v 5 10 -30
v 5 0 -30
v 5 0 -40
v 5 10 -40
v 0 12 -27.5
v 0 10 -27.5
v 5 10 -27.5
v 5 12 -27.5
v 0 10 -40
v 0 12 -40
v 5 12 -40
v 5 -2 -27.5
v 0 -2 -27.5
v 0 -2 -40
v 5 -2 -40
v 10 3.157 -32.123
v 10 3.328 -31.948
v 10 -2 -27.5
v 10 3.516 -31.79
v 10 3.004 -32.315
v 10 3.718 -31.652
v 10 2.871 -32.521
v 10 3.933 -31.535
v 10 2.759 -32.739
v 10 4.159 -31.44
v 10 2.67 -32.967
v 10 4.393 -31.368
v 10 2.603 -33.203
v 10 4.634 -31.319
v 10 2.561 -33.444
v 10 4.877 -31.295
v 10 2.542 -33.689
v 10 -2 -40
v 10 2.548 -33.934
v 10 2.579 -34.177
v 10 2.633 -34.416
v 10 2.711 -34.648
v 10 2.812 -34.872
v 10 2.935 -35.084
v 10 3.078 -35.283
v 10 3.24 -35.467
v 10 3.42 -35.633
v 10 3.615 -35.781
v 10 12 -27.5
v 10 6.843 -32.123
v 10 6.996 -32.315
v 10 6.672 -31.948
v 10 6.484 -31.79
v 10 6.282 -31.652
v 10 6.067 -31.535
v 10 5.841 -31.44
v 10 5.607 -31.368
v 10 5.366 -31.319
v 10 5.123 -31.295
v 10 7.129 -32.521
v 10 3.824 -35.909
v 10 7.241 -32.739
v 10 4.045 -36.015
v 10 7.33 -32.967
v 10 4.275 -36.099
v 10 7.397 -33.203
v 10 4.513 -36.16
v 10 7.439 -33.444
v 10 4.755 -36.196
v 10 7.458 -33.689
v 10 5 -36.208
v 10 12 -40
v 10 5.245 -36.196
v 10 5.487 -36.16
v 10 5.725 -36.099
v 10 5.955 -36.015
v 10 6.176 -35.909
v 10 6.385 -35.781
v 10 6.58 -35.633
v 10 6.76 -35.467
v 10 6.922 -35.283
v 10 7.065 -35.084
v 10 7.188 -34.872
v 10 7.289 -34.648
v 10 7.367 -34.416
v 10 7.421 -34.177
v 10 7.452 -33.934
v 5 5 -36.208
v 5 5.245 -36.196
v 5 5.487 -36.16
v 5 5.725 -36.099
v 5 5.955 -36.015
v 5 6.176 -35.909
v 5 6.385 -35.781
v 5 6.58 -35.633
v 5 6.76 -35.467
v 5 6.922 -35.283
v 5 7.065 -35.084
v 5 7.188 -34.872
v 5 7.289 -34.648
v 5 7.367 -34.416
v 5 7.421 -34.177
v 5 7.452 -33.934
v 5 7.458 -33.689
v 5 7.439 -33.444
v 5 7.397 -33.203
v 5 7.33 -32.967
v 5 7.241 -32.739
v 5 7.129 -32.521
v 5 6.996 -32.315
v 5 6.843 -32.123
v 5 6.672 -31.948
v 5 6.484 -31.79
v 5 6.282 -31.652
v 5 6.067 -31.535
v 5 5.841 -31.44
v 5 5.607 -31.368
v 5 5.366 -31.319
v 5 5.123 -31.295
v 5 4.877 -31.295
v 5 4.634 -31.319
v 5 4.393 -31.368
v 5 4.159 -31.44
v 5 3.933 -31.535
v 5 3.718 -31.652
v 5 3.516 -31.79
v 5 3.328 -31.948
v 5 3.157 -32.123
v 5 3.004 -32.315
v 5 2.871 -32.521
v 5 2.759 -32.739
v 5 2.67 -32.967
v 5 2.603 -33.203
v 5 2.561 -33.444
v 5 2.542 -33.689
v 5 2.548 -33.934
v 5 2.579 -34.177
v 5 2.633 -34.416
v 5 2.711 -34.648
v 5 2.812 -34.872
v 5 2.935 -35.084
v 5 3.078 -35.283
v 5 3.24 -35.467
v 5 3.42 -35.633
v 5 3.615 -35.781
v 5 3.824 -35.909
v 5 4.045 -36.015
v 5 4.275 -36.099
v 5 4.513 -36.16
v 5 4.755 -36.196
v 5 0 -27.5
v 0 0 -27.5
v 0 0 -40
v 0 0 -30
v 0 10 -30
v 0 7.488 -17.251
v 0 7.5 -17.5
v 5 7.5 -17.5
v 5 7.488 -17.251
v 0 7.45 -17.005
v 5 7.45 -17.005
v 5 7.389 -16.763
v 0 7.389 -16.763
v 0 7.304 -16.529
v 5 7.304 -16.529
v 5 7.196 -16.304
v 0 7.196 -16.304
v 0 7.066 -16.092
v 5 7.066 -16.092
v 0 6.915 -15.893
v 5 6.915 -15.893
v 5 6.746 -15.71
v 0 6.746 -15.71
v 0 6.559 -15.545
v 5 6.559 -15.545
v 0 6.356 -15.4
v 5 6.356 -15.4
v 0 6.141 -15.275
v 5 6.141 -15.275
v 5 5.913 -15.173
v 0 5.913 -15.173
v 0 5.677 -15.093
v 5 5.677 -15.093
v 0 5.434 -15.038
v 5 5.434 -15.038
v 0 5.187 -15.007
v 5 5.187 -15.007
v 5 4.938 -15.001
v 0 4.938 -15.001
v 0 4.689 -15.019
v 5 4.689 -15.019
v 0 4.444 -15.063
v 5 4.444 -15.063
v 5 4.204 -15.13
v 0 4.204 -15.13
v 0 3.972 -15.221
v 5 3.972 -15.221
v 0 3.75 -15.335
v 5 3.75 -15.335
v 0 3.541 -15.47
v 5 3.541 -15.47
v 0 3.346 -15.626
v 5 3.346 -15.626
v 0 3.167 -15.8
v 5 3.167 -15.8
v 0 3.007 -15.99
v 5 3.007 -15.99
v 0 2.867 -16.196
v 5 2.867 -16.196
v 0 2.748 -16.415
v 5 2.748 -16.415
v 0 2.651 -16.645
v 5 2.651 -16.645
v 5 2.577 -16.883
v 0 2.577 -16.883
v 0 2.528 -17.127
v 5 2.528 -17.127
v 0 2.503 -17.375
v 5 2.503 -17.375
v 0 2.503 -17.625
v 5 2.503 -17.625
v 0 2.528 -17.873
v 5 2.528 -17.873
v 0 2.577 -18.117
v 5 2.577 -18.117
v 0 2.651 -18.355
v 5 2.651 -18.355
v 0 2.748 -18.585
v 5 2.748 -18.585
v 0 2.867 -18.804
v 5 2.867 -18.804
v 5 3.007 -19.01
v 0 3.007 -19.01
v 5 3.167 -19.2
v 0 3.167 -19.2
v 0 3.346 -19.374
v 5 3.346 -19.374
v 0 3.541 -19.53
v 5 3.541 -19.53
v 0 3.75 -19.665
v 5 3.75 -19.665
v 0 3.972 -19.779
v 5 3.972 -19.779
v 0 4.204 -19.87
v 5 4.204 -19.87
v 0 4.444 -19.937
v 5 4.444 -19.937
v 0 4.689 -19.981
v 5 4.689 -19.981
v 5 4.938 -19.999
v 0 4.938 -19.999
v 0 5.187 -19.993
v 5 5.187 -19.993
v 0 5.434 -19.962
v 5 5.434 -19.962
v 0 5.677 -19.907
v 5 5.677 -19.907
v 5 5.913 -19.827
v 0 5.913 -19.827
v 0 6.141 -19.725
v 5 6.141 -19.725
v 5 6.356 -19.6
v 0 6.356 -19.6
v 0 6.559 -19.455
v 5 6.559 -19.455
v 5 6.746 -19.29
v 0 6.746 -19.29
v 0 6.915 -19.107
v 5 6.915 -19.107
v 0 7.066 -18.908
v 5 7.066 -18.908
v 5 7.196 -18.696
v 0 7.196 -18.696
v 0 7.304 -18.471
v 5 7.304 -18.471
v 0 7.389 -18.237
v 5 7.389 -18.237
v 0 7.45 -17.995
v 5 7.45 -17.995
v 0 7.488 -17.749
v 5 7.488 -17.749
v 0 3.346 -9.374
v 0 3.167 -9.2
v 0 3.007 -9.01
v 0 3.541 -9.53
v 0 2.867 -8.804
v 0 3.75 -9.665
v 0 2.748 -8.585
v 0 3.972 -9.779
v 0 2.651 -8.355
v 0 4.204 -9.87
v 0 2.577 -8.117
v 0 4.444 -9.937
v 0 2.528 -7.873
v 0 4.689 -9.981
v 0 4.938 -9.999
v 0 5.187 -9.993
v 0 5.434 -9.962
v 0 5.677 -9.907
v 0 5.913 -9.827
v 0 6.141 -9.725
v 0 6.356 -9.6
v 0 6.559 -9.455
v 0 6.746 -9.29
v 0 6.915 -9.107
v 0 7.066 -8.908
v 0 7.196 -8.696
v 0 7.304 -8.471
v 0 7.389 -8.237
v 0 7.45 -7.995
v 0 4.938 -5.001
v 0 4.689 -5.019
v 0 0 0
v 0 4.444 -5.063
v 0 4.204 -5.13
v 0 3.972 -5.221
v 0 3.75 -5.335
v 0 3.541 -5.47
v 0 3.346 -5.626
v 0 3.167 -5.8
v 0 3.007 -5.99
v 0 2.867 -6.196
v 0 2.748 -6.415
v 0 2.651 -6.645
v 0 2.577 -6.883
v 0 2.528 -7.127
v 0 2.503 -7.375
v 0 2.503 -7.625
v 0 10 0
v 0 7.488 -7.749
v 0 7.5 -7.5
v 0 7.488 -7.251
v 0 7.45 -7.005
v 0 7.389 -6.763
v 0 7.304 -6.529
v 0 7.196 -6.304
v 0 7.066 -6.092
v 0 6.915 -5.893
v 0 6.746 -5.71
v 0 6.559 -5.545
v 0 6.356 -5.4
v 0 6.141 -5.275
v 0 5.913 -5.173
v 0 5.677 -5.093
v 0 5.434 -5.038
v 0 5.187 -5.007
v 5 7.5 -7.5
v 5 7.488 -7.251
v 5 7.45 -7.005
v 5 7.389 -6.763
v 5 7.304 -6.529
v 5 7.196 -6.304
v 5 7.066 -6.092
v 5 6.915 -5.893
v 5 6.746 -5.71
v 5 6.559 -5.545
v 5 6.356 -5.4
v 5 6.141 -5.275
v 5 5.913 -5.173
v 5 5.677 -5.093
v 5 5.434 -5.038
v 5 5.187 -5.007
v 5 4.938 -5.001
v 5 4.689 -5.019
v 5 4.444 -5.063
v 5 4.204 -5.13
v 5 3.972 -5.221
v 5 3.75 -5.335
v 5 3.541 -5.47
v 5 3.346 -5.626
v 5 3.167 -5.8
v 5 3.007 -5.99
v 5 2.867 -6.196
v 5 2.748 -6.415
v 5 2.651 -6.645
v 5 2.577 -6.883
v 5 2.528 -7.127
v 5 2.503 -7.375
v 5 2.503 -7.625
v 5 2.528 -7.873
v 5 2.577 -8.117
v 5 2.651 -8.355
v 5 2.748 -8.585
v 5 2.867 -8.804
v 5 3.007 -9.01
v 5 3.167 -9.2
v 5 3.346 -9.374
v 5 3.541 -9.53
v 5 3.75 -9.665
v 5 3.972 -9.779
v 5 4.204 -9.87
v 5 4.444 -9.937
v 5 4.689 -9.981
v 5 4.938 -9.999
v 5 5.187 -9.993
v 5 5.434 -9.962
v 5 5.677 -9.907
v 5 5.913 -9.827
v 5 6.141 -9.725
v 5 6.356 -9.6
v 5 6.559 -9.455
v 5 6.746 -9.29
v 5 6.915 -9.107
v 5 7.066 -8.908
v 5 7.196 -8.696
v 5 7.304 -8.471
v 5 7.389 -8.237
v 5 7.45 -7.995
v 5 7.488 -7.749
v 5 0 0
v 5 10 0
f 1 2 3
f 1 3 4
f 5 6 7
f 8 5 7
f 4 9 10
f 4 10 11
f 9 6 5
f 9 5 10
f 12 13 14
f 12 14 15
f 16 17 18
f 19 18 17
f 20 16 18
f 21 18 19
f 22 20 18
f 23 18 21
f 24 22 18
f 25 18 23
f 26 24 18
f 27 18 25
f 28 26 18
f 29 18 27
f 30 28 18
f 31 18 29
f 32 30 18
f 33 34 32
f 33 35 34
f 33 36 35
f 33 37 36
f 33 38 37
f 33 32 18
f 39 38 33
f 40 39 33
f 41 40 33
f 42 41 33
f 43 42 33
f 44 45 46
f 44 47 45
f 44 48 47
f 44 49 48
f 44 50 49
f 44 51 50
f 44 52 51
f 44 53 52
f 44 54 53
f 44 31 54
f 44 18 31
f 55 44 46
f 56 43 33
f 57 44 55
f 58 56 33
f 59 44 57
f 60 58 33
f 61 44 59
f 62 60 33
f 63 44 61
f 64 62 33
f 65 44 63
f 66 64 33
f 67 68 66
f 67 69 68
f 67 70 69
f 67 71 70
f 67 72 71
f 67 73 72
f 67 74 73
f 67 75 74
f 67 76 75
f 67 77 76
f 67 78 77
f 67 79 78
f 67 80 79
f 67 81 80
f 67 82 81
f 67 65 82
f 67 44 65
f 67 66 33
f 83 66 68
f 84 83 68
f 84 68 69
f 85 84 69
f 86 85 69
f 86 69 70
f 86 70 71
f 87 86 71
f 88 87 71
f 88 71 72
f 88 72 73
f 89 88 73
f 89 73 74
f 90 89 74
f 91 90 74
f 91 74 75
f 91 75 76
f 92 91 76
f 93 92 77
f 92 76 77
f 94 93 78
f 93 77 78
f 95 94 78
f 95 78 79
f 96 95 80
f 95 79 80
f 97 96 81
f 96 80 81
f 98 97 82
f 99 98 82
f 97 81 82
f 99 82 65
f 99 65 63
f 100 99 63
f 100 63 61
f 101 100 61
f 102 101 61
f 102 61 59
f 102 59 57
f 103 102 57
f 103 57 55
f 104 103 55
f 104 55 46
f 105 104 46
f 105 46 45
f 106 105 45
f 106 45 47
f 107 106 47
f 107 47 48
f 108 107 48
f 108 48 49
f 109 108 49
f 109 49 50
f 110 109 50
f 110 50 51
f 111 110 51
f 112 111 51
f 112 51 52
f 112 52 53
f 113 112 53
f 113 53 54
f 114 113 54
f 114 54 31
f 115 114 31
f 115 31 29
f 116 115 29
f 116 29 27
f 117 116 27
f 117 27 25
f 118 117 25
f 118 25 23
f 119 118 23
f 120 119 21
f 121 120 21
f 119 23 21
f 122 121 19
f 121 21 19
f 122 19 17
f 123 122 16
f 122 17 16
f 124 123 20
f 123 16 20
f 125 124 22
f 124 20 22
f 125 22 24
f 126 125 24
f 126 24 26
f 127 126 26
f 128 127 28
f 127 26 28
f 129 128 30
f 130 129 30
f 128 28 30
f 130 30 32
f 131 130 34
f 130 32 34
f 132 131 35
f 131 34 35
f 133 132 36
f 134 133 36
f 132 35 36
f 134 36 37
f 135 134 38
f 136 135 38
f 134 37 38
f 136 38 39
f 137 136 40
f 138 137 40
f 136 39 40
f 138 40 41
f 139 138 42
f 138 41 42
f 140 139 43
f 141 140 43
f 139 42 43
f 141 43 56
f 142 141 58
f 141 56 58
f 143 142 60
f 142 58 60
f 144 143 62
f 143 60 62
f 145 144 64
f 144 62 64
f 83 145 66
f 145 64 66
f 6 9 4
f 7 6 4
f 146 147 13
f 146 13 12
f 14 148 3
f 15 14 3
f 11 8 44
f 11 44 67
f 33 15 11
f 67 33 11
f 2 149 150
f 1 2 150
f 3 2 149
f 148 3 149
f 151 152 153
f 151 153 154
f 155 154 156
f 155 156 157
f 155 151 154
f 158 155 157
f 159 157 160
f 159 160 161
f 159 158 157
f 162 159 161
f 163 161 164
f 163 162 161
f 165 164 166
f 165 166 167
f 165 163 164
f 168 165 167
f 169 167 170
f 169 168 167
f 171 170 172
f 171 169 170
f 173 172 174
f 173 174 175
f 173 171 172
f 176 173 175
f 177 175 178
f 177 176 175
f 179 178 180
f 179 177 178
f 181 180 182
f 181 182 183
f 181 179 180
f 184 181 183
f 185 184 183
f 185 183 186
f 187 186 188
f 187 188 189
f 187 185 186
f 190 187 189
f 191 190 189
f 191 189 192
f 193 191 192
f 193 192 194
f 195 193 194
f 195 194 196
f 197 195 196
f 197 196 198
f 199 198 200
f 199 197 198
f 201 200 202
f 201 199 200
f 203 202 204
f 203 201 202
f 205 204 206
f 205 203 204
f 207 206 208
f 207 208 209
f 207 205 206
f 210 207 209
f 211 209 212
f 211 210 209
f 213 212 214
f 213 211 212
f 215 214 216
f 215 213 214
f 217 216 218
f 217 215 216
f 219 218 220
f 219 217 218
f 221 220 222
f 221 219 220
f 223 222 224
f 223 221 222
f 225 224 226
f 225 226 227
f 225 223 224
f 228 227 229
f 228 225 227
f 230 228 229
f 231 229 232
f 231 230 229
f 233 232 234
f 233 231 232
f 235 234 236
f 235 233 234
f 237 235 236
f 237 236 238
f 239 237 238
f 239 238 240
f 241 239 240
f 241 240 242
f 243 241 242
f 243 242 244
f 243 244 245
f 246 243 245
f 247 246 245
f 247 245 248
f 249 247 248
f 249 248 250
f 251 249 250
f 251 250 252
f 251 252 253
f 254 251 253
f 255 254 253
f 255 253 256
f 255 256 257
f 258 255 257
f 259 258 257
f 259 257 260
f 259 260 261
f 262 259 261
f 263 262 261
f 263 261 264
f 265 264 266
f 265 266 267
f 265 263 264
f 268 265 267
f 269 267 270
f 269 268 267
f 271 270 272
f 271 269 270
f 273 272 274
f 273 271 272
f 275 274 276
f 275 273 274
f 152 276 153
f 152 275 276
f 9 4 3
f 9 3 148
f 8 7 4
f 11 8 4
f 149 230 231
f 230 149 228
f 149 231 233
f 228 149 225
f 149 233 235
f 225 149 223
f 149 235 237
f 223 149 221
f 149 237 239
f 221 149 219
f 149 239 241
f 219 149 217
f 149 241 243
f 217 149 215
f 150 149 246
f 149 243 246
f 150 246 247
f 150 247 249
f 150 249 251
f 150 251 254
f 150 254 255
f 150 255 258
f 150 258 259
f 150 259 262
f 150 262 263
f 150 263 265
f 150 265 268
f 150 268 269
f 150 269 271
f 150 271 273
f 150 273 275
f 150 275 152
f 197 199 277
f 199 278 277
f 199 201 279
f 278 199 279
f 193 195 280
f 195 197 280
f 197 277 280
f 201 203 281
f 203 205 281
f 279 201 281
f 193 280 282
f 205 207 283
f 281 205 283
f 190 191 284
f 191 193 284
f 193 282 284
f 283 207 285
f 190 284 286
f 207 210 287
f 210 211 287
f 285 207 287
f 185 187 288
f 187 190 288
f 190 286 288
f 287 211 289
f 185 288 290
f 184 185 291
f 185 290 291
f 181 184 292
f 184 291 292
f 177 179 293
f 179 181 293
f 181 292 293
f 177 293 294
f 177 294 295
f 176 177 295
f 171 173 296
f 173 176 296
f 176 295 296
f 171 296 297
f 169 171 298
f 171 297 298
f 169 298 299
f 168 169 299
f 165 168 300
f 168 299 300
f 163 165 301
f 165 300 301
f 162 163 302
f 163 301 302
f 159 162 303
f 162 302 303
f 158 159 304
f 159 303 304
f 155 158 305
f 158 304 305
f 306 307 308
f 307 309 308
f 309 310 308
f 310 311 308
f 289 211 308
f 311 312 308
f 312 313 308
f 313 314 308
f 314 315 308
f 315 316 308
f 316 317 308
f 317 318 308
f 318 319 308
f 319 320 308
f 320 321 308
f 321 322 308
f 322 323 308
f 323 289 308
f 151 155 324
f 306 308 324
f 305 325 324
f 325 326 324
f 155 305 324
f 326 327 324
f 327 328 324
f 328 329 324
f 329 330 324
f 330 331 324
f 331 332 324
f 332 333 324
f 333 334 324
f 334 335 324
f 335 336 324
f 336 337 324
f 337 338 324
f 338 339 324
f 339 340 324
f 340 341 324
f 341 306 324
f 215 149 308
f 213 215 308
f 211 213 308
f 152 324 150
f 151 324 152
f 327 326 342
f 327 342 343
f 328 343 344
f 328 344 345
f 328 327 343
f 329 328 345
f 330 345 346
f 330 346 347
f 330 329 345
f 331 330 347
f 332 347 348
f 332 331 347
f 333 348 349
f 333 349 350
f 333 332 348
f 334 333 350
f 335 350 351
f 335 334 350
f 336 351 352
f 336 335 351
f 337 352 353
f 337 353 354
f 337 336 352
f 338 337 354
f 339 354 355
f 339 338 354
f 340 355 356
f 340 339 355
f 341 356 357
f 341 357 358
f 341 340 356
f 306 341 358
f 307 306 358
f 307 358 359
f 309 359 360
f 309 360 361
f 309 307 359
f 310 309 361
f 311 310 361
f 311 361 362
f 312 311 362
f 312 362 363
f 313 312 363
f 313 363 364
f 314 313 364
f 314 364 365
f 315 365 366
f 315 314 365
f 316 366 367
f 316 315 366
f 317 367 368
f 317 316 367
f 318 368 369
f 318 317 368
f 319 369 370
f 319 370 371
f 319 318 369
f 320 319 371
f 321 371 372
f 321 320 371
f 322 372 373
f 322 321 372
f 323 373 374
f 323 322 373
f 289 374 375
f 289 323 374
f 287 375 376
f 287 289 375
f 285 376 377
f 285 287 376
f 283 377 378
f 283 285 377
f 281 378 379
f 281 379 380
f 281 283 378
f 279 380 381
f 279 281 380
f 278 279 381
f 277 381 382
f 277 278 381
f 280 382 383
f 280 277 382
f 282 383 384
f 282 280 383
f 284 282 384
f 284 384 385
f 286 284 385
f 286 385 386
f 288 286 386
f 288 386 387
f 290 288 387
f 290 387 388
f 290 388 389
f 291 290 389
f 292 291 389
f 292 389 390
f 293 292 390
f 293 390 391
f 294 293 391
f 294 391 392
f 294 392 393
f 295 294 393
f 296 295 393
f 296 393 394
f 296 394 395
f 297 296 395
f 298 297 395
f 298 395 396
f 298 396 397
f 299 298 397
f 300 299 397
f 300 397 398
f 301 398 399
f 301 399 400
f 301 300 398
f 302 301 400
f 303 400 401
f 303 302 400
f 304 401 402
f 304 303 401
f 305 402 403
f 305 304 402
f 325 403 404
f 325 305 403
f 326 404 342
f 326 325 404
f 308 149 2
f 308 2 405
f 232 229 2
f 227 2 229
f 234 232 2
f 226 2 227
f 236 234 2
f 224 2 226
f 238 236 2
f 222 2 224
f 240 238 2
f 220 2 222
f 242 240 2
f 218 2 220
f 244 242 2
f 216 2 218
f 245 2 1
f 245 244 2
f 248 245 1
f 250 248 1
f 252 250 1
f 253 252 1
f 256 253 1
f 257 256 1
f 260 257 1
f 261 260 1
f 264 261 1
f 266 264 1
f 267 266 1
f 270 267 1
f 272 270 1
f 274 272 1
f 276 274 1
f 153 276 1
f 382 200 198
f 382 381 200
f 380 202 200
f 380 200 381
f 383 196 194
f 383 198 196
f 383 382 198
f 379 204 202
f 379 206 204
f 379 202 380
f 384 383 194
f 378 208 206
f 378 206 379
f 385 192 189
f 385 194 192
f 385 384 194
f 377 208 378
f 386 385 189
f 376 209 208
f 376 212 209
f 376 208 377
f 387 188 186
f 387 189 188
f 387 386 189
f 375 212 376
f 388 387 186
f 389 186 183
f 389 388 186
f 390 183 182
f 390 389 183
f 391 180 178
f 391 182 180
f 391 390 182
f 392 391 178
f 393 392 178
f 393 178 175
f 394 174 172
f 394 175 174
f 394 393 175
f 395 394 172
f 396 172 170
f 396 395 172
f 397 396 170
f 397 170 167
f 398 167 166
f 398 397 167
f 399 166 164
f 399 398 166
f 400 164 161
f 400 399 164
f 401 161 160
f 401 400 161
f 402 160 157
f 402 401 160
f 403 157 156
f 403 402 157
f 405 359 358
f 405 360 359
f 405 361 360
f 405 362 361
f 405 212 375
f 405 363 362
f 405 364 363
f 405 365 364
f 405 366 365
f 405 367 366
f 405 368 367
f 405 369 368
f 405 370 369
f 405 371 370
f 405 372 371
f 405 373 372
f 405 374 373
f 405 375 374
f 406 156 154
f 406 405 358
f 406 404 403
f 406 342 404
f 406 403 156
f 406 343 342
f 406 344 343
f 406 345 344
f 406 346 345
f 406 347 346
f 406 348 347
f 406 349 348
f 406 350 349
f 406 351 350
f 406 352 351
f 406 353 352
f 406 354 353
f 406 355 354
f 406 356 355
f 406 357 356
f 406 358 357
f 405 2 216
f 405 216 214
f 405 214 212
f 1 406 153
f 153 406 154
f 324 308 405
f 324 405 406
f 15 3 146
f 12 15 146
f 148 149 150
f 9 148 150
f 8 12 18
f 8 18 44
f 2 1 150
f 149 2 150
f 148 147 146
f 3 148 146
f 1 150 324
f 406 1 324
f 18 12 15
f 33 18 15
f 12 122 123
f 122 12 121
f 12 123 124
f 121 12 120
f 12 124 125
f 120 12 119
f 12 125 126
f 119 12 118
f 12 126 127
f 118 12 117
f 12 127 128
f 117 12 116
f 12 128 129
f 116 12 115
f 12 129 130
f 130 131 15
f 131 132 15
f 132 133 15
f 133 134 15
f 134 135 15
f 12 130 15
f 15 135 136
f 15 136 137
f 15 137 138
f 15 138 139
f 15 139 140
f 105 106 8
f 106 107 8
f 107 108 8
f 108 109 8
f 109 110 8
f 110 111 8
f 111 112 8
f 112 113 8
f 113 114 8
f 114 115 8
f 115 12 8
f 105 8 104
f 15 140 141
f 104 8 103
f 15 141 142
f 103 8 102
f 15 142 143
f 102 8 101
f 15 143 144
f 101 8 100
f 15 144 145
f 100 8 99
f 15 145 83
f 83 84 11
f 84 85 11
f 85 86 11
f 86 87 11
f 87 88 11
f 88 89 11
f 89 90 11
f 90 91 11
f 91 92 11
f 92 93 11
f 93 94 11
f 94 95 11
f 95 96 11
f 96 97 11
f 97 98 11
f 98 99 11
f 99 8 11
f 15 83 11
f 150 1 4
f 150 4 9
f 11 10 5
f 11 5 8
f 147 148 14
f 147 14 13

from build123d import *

# Parameters (mm, degrees)
SKETCH1_BP_W     = 10
SKETCH1_BP_H     = 30
SKETCH1_BP_R     = 2.5
EXTRUSION1_DEPTH = 5
SKETCH2_BP_W     = 5
SKETCH2_BP_H     = 10
EXTRUSION2_DEPTH = 10
SKETCH4_BP_W     = 5
SKETCH4_BP_H     = 12.5
EXTRUSION3_DEPTH = 2
SKETCH5_BP_W     = 5
SKETCH5_BP_H     = 12.5
EXTRUSION4_DEPTH = 2
SKETCH6_BP_W     = 12.5
SKETCH6_BP_H     = 14
EXTRUSION6_DEPTH = 5
HOLE1_BP_R       = 2.4585
HOLE1_DEPTH      = 9.477216


with BuildPart() as extrusion1:
    # Sketch1_bp → Extrusion1 (new body)
    with BuildSketch(Plane.YZ):
        with Locations((5, -15)):
            Rectangle(SKETCH1_BP_W, SKETCH1_BP_H)
        with Locations((5, -7.5)):
            Circle(SKETCH1_BP_R, mode=Mode.SUBTRACT)
        with Locations((5, -17.5)):
            Circle(SKETCH1_BP_R, mode=Mode.SUBTRACT)
    extrude(amount=EXTRUSION1_DEPTH)


with BuildPart() as extrusion2:
    # Sketch2_bp → Extrusion2 (new body)
    with BuildSketch(Plane(origin=(0, 0, -30), x_dir=(-1, 0, 0), z_dir=(0, 0, -1))):
        with Locations((-2.5, 5)):
            Rectangle(SKETCH2_BP_W, SKETCH2_BP_H)
    extrude(amount=EXTRUSION2_DEPTH)


with BuildPart() as extrusion3:
    # Sketch4_bp → Extrusion3 (new body)
    with BuildSketch(Plane(origin=(0, 10, 0), x_dir=(1, 0, 0), z_dir=(0, 1, 0))):
        with Locations((2.5, 33.75)):
            Rectangle(SKETCH4_BP_W, SKETCH4_BP_H)
    extrude(amount=EXTRUSION3_DEPTH)


with BuildPart() as extrusion4:
    # Sketch5_bp → Extrusion4 (new body)
    with BuildSketch(Plane.XZ):
        with Locations((2.5, -33.75)):
            Rectangle(SKETCH5_BP_W, SKETCH5_BP_H)
    extrude(amount=EXTRUSION4_DEPTH)


with BuildPart() as hole1:
    # Sketch6_bp → Extrusion6 (new body)
    with BuildSketch(Plane(origin=(5, 0, 0), x_dir=(0, 0, -1), z_dir=(1, 0, 0))):
        with Locations((33.75, 5)):
            Rectangle(SKETCH6_BP_W, SKETCH6_BP_H)
    extrude(amount=EXTRUSION6_DEPTH)

    # Hole1_bp → Hole1 (cut)
    with BuildSketch(Plane(origin=(10, 0, 0), x_dir=(0, 0, -1), z_dir=(1, 0, 0))):
        with Locations((33.75, 5)):
            Circle(HOLE1_BP_R)
    extrude(amount=-HOLE1_DEPTH, mode=Mode.SUBTRACT)


solid = Compound([extrusion1.part, extrusion2.part, extrusion3.part, extrusion4.part, hole1.part])
